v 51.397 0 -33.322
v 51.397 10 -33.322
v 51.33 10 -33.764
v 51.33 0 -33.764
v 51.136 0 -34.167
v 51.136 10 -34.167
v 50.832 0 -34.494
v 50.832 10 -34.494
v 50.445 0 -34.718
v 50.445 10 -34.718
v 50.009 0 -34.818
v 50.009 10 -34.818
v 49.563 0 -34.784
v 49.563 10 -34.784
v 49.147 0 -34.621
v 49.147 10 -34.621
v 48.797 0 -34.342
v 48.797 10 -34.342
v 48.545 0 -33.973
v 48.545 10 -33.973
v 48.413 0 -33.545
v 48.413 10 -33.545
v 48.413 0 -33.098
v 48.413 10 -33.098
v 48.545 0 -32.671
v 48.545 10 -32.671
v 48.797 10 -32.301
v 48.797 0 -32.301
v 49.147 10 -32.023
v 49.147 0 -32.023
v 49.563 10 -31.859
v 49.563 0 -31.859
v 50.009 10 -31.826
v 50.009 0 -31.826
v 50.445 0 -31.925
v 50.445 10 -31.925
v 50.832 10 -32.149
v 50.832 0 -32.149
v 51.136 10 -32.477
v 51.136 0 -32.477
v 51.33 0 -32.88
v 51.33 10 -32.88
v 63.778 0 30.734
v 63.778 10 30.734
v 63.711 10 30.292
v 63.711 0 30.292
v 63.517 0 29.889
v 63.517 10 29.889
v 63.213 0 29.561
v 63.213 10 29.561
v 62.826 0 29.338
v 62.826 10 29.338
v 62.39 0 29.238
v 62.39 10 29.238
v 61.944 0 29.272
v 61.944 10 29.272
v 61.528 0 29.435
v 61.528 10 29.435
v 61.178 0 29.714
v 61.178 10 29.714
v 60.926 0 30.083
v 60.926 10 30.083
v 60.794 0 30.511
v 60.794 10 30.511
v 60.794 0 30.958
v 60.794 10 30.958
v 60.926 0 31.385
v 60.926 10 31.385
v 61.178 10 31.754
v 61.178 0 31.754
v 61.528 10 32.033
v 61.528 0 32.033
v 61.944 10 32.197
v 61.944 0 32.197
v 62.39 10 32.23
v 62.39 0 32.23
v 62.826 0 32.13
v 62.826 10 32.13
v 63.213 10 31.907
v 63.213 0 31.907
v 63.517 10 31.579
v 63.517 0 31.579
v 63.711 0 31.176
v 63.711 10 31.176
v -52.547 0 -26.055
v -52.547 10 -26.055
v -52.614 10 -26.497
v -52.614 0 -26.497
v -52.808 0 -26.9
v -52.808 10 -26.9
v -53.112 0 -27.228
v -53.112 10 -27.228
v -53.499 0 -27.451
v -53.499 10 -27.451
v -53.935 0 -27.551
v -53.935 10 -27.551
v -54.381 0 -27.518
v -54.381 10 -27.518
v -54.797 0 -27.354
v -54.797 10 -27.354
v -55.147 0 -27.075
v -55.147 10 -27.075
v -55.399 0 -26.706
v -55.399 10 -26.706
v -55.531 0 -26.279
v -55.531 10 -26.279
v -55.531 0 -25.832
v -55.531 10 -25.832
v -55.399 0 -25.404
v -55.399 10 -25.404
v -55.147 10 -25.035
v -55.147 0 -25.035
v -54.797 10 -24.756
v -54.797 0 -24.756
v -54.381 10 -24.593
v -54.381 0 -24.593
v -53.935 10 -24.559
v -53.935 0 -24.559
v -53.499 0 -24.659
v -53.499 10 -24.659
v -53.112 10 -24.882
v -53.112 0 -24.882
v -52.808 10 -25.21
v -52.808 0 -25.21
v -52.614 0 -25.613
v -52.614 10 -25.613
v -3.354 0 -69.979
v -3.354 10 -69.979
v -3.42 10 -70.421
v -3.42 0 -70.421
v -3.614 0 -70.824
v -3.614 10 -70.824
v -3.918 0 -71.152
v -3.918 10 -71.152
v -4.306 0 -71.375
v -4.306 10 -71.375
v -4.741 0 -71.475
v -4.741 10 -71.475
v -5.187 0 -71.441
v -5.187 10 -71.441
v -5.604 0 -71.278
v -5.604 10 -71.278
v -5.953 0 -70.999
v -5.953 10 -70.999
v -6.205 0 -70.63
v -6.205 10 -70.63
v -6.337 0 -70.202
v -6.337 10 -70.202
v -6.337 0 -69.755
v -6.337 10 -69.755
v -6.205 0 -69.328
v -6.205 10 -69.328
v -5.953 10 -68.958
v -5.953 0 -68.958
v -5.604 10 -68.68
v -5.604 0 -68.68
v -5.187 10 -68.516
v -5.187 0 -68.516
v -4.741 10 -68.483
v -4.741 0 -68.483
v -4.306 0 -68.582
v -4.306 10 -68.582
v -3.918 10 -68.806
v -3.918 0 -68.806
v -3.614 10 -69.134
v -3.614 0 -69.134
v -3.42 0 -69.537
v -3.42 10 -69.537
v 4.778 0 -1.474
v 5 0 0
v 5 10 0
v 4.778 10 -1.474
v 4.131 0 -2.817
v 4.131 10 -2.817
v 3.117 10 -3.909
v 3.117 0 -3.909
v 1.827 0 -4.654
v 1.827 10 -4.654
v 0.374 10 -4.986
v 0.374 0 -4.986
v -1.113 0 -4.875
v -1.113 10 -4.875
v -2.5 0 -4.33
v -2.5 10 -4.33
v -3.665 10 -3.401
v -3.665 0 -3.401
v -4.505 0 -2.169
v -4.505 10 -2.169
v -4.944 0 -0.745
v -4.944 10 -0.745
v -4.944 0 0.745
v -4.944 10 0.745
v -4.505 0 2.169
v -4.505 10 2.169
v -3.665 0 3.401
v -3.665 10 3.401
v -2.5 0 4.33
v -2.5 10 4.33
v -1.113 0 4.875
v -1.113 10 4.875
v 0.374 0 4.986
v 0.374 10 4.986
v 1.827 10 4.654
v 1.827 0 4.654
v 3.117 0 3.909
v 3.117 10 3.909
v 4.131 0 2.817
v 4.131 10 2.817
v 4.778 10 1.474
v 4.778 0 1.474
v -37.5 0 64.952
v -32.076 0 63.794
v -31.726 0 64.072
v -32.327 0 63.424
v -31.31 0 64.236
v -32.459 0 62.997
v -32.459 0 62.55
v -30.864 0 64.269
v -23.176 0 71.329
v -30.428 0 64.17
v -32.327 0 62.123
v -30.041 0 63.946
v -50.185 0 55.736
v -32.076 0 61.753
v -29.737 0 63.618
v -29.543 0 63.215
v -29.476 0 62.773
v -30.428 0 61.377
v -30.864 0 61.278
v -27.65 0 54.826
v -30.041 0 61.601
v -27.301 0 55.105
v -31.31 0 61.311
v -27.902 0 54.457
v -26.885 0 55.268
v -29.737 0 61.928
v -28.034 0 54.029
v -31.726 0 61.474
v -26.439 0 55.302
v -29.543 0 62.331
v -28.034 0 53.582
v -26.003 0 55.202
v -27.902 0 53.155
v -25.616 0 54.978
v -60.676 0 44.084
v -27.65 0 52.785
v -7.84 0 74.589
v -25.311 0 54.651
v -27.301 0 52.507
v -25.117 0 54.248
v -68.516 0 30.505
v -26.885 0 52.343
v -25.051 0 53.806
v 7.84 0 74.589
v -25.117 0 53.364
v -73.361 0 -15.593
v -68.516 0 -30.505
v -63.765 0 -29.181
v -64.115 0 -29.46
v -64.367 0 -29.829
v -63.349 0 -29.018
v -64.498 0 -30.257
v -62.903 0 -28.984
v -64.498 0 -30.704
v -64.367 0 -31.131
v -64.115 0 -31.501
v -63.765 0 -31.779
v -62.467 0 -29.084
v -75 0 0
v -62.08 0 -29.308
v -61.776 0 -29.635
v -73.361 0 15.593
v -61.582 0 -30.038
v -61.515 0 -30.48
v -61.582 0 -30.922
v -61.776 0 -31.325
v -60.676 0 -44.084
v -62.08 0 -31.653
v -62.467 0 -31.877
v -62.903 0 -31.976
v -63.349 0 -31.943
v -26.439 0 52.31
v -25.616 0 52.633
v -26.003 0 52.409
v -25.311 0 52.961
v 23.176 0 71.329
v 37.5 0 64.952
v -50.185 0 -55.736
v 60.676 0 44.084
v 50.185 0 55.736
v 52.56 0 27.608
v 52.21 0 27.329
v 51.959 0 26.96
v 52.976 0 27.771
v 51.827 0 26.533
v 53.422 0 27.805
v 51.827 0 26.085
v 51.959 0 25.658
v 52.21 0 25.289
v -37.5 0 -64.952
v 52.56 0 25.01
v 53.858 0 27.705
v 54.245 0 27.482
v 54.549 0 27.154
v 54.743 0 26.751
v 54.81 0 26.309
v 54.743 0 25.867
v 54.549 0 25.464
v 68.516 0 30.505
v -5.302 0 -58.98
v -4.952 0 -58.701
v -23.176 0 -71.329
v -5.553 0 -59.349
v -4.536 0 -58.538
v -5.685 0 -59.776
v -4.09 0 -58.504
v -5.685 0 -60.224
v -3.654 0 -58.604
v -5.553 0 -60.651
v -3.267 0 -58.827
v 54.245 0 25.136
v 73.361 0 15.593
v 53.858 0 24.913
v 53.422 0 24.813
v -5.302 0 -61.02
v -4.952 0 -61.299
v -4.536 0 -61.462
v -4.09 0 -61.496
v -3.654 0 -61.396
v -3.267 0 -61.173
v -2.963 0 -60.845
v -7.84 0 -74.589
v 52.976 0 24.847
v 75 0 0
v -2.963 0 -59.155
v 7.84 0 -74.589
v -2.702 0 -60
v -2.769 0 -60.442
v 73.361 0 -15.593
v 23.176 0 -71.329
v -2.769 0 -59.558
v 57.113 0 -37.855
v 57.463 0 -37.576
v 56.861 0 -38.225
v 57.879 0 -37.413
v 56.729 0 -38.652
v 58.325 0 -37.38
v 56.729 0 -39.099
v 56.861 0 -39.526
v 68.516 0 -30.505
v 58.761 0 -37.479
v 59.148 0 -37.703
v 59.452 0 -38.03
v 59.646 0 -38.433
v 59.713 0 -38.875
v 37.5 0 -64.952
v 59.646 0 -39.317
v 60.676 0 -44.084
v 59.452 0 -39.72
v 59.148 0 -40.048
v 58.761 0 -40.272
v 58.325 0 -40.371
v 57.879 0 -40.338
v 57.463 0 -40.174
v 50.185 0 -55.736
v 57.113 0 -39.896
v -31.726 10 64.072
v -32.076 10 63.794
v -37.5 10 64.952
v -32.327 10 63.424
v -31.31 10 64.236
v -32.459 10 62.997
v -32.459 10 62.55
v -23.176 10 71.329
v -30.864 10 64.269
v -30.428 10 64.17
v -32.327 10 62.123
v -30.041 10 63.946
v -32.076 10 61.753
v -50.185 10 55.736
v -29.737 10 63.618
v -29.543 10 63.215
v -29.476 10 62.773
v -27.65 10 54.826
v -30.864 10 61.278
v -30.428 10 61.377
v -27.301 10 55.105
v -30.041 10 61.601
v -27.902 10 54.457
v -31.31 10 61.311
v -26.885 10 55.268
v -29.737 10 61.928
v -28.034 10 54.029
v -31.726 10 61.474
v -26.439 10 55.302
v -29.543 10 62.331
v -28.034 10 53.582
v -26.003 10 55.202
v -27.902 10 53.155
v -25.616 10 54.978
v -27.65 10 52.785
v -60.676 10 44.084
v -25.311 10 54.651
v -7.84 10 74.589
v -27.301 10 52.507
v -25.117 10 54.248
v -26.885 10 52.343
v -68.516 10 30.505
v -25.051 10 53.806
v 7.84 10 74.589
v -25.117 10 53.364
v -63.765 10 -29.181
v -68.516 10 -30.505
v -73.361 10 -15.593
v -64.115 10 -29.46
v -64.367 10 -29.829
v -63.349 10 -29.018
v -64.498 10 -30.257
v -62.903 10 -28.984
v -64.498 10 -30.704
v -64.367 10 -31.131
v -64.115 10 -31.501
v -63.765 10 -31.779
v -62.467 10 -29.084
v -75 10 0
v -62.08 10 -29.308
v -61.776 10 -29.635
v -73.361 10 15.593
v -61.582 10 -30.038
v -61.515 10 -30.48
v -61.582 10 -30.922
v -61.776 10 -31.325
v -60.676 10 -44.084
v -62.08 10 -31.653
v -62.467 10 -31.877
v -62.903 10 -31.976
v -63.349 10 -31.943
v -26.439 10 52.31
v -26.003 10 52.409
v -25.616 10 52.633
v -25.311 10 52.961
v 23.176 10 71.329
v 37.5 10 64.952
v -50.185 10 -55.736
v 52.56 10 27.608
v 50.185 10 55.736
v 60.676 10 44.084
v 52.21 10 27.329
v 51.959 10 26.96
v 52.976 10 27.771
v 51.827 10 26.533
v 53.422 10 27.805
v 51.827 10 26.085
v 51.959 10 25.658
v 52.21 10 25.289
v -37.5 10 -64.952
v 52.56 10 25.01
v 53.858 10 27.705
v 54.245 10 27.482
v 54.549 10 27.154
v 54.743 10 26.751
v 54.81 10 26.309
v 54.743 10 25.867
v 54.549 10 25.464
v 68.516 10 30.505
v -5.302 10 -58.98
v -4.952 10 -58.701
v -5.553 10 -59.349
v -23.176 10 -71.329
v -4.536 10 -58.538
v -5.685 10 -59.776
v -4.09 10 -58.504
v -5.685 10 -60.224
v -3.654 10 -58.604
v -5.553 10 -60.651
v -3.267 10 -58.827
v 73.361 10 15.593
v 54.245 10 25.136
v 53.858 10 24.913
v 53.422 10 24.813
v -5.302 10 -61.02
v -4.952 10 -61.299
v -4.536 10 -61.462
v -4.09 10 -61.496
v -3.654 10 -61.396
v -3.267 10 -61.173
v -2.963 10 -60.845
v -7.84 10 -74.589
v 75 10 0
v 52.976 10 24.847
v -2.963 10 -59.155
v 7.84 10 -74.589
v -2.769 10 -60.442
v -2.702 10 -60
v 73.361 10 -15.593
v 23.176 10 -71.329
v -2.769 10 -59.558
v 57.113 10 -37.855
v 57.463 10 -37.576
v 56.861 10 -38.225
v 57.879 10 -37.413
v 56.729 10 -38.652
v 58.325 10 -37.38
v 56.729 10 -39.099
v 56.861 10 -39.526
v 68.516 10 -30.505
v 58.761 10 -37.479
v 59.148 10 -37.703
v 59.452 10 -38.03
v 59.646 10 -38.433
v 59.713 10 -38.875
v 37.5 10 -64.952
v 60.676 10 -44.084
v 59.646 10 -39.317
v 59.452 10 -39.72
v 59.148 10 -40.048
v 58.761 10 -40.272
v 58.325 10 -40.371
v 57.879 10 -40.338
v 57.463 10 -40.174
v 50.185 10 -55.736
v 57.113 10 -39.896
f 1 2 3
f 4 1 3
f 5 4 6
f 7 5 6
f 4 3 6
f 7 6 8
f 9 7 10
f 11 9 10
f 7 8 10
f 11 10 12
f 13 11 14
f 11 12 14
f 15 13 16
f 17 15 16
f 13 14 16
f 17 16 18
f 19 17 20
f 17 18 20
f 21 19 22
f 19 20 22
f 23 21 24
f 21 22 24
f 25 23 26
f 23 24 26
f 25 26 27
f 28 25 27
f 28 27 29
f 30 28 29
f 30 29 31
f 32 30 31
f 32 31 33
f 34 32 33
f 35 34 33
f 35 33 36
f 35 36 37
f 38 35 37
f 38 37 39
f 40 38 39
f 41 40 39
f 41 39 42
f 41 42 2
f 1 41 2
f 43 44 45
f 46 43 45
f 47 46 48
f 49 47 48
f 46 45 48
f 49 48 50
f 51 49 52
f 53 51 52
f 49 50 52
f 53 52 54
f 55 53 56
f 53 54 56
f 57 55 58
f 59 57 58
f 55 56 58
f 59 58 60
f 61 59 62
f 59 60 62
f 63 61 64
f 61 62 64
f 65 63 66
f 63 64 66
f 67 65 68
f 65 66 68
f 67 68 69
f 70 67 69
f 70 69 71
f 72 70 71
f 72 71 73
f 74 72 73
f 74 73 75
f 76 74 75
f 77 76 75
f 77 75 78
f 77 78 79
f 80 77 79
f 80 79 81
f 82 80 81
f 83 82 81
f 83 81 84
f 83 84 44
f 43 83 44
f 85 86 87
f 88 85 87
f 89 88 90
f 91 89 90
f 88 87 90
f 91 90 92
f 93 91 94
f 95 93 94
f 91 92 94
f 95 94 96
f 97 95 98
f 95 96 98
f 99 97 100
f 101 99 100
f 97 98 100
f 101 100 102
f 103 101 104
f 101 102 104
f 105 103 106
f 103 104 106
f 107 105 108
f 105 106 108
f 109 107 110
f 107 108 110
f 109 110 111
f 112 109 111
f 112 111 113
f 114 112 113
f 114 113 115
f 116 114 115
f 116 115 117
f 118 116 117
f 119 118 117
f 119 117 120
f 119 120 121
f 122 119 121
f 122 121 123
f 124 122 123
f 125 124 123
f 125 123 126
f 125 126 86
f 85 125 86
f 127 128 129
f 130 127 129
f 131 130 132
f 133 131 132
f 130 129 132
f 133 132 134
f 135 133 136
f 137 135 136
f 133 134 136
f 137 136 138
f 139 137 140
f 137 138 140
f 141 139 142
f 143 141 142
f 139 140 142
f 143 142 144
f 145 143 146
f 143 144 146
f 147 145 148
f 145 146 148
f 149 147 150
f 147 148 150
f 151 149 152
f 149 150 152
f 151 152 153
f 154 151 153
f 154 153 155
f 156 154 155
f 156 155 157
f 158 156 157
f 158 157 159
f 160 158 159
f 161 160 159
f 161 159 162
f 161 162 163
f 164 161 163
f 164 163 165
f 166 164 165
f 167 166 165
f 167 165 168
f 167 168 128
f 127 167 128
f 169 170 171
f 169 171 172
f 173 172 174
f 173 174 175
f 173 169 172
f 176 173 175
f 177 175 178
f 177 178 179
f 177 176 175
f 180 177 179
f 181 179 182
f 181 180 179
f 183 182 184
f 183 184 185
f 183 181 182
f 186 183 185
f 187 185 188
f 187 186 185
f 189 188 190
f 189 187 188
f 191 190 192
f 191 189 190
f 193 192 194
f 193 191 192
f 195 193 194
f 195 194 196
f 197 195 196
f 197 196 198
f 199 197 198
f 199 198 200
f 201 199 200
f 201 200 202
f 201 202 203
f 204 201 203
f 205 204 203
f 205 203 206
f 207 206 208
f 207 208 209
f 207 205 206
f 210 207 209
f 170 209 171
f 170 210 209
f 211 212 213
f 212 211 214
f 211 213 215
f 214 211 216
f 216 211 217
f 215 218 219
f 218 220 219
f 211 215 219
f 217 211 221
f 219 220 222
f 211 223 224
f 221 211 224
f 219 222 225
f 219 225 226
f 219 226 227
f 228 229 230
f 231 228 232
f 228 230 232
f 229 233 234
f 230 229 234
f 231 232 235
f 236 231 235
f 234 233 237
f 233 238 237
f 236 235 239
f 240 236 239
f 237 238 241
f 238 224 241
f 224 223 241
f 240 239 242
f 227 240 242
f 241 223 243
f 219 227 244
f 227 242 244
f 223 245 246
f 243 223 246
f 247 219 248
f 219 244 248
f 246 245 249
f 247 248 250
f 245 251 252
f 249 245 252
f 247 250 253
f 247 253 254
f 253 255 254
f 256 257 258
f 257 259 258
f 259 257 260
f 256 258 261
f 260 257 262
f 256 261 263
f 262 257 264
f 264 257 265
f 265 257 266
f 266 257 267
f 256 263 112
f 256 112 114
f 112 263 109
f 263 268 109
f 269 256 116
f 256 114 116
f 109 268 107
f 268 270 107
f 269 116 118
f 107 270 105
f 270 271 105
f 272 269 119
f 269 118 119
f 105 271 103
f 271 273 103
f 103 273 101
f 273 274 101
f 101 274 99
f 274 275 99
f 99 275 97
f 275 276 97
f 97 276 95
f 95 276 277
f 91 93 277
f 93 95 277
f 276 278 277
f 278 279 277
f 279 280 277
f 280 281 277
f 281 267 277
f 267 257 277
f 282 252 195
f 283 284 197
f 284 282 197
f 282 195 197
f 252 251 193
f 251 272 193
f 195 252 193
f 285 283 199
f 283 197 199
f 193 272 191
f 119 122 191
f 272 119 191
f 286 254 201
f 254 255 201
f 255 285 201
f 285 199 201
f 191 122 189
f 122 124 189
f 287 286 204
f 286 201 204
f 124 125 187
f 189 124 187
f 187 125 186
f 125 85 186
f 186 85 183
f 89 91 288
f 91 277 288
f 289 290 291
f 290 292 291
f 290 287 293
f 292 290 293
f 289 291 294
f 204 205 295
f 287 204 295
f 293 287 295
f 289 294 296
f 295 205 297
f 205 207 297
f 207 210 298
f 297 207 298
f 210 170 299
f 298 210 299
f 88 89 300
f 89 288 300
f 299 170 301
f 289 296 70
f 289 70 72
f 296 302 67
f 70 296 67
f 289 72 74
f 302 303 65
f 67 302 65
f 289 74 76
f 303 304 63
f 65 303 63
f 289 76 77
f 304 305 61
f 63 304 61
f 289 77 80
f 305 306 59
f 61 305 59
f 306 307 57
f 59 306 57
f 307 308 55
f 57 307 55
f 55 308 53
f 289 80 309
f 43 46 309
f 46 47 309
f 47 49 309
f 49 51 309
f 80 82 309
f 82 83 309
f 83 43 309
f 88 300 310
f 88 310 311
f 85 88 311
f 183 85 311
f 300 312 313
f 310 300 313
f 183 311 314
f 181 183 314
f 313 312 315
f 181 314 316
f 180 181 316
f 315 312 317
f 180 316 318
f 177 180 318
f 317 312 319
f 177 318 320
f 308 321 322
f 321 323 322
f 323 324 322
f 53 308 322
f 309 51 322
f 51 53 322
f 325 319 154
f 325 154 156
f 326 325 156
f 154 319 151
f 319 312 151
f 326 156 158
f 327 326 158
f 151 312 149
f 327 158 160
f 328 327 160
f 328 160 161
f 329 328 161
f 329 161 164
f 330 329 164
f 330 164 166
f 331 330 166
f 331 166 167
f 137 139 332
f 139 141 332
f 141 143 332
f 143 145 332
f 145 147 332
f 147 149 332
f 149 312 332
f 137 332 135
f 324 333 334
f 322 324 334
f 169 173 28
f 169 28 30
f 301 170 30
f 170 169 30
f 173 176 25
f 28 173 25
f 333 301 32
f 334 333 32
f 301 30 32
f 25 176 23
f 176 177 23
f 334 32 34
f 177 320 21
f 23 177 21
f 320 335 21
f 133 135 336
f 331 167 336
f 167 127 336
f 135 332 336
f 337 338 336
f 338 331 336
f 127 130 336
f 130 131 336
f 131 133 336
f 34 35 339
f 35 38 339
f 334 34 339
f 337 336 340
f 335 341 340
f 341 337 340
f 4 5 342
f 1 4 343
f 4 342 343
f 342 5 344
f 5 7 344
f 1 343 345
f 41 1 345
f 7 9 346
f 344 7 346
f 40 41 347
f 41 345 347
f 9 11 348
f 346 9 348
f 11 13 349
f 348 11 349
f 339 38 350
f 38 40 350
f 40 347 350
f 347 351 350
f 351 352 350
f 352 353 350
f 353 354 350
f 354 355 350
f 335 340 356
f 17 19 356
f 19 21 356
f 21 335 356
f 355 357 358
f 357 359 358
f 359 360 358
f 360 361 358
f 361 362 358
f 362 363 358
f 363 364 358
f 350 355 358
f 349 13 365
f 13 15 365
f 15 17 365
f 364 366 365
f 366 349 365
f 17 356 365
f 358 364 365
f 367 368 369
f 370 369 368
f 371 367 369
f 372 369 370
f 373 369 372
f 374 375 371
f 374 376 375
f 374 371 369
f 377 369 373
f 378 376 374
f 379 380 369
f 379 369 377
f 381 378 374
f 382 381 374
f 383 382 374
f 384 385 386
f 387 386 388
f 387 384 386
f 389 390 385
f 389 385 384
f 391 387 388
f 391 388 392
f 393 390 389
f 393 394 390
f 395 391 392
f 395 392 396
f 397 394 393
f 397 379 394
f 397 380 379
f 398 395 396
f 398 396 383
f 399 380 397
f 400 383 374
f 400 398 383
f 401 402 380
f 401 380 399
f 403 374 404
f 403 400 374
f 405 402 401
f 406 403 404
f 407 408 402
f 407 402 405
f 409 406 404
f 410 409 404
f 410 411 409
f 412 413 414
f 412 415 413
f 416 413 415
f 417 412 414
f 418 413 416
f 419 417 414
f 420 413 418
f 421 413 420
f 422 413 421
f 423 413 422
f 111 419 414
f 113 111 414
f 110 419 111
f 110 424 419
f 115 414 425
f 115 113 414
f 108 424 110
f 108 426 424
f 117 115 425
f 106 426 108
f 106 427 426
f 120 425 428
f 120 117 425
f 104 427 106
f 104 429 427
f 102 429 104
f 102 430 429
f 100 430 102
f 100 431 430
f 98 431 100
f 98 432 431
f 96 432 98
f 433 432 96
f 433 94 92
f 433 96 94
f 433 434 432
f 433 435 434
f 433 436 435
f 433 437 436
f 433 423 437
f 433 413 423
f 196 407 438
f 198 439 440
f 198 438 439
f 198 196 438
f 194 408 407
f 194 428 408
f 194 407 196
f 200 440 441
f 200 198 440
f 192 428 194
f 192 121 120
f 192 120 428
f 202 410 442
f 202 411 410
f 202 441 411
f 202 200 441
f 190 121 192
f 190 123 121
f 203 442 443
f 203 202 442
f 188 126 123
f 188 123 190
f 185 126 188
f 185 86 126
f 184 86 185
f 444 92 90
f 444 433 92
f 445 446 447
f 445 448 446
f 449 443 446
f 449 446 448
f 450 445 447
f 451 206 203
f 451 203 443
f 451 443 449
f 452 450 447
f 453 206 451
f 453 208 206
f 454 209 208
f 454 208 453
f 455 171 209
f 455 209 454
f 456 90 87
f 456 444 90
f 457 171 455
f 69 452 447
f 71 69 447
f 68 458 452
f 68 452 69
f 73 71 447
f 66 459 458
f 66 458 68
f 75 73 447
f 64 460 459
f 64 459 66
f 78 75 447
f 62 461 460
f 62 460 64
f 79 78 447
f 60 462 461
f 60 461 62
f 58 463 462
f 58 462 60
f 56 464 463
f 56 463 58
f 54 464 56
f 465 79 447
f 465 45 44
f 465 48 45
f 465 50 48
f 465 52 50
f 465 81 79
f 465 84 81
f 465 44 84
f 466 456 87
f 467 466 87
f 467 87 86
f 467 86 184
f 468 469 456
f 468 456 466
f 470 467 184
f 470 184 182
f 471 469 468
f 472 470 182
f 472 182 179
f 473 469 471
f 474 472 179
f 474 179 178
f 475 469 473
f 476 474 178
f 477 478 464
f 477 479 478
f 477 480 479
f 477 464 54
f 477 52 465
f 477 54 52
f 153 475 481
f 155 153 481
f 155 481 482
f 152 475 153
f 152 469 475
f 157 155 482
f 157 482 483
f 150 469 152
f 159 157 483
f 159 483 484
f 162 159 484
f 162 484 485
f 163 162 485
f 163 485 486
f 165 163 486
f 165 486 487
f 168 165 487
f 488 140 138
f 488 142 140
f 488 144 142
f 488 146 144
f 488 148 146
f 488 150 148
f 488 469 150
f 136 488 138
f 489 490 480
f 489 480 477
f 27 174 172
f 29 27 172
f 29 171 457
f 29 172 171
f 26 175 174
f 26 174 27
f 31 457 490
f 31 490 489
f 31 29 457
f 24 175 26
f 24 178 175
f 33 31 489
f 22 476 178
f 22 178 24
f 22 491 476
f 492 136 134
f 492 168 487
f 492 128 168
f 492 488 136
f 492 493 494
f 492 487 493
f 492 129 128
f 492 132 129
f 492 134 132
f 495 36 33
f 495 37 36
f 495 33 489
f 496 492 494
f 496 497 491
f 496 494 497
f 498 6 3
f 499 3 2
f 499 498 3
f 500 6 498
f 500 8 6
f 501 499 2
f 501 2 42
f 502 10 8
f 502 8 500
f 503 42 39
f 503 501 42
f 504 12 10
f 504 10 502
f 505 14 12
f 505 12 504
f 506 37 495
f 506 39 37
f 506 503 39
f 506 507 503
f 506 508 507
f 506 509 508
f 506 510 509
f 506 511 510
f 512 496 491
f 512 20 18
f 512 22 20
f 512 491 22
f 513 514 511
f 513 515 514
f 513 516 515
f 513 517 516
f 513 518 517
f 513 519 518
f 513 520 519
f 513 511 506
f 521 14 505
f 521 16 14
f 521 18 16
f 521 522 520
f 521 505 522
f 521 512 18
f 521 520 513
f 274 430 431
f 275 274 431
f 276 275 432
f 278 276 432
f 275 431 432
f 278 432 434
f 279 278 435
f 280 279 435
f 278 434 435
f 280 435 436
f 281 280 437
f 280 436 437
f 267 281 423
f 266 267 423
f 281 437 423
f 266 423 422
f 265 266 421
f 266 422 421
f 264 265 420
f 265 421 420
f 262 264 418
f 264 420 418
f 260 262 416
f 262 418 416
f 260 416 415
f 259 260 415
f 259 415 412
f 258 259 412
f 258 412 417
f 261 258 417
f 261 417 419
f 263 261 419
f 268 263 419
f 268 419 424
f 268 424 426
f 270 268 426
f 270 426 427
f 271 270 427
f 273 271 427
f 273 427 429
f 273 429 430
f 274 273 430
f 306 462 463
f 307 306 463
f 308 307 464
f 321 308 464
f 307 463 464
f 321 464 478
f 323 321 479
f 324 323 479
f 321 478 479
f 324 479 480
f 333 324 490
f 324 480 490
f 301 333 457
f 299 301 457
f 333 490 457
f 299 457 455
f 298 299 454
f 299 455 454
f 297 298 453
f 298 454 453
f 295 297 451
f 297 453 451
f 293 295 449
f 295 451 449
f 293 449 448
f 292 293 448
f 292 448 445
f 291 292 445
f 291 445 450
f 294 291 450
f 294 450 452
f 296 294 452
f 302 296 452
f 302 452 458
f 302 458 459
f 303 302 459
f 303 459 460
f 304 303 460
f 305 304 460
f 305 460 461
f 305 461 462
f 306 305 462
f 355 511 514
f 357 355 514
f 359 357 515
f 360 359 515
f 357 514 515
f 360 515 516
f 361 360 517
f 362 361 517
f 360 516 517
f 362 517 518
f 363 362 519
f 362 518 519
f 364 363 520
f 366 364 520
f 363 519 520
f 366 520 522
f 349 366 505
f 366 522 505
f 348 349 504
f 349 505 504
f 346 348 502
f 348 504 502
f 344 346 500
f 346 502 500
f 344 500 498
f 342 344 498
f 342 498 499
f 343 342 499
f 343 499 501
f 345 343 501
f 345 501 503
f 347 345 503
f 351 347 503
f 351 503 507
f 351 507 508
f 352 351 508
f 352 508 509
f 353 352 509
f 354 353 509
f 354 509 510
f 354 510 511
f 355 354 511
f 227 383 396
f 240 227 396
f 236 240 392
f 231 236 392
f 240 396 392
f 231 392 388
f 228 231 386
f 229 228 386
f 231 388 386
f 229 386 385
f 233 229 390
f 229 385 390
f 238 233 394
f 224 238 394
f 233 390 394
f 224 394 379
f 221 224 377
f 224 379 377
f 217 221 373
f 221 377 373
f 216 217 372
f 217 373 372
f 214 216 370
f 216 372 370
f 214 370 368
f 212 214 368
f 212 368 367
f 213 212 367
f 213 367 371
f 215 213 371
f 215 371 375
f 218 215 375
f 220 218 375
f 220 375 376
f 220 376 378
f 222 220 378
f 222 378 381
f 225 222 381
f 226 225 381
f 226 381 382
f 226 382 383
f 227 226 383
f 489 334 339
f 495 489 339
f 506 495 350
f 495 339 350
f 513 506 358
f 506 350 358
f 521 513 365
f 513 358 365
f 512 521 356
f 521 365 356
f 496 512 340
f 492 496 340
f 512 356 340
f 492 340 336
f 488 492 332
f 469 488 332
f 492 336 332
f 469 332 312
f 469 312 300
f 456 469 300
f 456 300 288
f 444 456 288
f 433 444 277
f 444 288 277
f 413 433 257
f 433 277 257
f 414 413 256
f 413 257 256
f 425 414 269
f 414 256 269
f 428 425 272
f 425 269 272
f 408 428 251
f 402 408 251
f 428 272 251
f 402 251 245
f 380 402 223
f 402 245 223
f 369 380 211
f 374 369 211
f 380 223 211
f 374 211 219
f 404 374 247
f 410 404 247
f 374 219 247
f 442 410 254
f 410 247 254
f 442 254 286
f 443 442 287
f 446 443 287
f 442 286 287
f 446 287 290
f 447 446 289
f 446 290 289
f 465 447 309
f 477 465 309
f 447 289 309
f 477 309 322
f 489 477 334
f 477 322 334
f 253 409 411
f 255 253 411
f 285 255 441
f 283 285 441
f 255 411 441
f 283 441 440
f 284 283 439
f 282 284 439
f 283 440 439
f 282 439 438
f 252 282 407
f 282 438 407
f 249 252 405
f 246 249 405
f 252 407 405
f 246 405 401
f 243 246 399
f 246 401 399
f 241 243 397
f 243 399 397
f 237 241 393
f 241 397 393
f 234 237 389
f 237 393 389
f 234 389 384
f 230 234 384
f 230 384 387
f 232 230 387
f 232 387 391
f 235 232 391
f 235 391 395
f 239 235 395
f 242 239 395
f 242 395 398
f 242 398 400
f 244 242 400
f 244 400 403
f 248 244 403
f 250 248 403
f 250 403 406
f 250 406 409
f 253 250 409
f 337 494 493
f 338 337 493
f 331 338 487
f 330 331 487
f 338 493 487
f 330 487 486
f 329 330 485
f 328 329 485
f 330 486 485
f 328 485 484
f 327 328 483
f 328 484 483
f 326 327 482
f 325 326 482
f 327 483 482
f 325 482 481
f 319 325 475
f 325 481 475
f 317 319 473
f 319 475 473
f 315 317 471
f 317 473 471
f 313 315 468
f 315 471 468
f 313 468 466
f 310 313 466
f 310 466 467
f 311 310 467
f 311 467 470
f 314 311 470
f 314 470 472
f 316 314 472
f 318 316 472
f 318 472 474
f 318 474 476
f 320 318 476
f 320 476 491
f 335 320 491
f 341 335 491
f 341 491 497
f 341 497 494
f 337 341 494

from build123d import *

# Parameters (mm, degrees)
SKETCH1_R               = 75
SKETCH1_R_2             = 5
BOSS_EXTRUDE1_DEPTH     = 10
SKETCH4_R               = 1.5
CUT_EXTRUDE1_DEPTH      = 1
CUT_EXTRUDE1_DEPTH_BACK = 11


with BuildPart() as part:
    # Sketch1 → Boss-Extrude1 (new body)
    with BuildSketch(Plane(origin=(0, 0, 0), x_dir=(1, 0, 0), z_dir=(0, 1, 0))):
        Circle(SKETCH1_R)
        Circle(SKETCH1_R_2, mode=Mode.SUBTRACT)
    extrude(amount=BOSS_EXTRUDE1_DEPTH)

    # Sketch4 → Cut-Extrude1 (cut, two sides)
    with BuildSketch(Plane(origin=(0, 10, 0), x_dir=(1, 0, 0), z_dir=(0, 1, 0))) as cut_extrude1_sk:
        with Locations((-26.550808926, -53.805711085)):
            Circle(SKETCH4_R)
        with Locations((-30.975943747, -62.773329599)):
            Circle(SKETCH4_R)
        with Locations((-63.01509769, 30.480268572)):
            Circle(SKETCH4_R)
        with Locations((-54.047479176, 26.05513375)):
            Circle(SKETCH4_R)
        with Locations((62.277654423, -30.734175657)):
            Circle(SKETCH4_R)
        with Locations((53.310035909, -26.309040836)):
            Circle(SKETCH4_R)
        with Locations((-4.853556436, 69.978752855)):
            Circle(SKETCH4_R)
        with Locations((-4.202026349, 60)):
            Circle(SKETCH4_R)
        with Locations((49.896530564, 33.321708205)):
            Circle(SKETCH4_R)
        with Locations((58.212618991, 38.875326239)):
            Circle(SKETCH4_R)
    extrude(amount=CUT_EXTRUDE1_DEPTH, mode=Mode.SUBTRACT)
    extrude(cut_extrude1_sk.sketch, amount=-CUT_EXTRUDE1_DEPTH_BACK, mode=Mode.SUBTRACT)


solid = part.part
